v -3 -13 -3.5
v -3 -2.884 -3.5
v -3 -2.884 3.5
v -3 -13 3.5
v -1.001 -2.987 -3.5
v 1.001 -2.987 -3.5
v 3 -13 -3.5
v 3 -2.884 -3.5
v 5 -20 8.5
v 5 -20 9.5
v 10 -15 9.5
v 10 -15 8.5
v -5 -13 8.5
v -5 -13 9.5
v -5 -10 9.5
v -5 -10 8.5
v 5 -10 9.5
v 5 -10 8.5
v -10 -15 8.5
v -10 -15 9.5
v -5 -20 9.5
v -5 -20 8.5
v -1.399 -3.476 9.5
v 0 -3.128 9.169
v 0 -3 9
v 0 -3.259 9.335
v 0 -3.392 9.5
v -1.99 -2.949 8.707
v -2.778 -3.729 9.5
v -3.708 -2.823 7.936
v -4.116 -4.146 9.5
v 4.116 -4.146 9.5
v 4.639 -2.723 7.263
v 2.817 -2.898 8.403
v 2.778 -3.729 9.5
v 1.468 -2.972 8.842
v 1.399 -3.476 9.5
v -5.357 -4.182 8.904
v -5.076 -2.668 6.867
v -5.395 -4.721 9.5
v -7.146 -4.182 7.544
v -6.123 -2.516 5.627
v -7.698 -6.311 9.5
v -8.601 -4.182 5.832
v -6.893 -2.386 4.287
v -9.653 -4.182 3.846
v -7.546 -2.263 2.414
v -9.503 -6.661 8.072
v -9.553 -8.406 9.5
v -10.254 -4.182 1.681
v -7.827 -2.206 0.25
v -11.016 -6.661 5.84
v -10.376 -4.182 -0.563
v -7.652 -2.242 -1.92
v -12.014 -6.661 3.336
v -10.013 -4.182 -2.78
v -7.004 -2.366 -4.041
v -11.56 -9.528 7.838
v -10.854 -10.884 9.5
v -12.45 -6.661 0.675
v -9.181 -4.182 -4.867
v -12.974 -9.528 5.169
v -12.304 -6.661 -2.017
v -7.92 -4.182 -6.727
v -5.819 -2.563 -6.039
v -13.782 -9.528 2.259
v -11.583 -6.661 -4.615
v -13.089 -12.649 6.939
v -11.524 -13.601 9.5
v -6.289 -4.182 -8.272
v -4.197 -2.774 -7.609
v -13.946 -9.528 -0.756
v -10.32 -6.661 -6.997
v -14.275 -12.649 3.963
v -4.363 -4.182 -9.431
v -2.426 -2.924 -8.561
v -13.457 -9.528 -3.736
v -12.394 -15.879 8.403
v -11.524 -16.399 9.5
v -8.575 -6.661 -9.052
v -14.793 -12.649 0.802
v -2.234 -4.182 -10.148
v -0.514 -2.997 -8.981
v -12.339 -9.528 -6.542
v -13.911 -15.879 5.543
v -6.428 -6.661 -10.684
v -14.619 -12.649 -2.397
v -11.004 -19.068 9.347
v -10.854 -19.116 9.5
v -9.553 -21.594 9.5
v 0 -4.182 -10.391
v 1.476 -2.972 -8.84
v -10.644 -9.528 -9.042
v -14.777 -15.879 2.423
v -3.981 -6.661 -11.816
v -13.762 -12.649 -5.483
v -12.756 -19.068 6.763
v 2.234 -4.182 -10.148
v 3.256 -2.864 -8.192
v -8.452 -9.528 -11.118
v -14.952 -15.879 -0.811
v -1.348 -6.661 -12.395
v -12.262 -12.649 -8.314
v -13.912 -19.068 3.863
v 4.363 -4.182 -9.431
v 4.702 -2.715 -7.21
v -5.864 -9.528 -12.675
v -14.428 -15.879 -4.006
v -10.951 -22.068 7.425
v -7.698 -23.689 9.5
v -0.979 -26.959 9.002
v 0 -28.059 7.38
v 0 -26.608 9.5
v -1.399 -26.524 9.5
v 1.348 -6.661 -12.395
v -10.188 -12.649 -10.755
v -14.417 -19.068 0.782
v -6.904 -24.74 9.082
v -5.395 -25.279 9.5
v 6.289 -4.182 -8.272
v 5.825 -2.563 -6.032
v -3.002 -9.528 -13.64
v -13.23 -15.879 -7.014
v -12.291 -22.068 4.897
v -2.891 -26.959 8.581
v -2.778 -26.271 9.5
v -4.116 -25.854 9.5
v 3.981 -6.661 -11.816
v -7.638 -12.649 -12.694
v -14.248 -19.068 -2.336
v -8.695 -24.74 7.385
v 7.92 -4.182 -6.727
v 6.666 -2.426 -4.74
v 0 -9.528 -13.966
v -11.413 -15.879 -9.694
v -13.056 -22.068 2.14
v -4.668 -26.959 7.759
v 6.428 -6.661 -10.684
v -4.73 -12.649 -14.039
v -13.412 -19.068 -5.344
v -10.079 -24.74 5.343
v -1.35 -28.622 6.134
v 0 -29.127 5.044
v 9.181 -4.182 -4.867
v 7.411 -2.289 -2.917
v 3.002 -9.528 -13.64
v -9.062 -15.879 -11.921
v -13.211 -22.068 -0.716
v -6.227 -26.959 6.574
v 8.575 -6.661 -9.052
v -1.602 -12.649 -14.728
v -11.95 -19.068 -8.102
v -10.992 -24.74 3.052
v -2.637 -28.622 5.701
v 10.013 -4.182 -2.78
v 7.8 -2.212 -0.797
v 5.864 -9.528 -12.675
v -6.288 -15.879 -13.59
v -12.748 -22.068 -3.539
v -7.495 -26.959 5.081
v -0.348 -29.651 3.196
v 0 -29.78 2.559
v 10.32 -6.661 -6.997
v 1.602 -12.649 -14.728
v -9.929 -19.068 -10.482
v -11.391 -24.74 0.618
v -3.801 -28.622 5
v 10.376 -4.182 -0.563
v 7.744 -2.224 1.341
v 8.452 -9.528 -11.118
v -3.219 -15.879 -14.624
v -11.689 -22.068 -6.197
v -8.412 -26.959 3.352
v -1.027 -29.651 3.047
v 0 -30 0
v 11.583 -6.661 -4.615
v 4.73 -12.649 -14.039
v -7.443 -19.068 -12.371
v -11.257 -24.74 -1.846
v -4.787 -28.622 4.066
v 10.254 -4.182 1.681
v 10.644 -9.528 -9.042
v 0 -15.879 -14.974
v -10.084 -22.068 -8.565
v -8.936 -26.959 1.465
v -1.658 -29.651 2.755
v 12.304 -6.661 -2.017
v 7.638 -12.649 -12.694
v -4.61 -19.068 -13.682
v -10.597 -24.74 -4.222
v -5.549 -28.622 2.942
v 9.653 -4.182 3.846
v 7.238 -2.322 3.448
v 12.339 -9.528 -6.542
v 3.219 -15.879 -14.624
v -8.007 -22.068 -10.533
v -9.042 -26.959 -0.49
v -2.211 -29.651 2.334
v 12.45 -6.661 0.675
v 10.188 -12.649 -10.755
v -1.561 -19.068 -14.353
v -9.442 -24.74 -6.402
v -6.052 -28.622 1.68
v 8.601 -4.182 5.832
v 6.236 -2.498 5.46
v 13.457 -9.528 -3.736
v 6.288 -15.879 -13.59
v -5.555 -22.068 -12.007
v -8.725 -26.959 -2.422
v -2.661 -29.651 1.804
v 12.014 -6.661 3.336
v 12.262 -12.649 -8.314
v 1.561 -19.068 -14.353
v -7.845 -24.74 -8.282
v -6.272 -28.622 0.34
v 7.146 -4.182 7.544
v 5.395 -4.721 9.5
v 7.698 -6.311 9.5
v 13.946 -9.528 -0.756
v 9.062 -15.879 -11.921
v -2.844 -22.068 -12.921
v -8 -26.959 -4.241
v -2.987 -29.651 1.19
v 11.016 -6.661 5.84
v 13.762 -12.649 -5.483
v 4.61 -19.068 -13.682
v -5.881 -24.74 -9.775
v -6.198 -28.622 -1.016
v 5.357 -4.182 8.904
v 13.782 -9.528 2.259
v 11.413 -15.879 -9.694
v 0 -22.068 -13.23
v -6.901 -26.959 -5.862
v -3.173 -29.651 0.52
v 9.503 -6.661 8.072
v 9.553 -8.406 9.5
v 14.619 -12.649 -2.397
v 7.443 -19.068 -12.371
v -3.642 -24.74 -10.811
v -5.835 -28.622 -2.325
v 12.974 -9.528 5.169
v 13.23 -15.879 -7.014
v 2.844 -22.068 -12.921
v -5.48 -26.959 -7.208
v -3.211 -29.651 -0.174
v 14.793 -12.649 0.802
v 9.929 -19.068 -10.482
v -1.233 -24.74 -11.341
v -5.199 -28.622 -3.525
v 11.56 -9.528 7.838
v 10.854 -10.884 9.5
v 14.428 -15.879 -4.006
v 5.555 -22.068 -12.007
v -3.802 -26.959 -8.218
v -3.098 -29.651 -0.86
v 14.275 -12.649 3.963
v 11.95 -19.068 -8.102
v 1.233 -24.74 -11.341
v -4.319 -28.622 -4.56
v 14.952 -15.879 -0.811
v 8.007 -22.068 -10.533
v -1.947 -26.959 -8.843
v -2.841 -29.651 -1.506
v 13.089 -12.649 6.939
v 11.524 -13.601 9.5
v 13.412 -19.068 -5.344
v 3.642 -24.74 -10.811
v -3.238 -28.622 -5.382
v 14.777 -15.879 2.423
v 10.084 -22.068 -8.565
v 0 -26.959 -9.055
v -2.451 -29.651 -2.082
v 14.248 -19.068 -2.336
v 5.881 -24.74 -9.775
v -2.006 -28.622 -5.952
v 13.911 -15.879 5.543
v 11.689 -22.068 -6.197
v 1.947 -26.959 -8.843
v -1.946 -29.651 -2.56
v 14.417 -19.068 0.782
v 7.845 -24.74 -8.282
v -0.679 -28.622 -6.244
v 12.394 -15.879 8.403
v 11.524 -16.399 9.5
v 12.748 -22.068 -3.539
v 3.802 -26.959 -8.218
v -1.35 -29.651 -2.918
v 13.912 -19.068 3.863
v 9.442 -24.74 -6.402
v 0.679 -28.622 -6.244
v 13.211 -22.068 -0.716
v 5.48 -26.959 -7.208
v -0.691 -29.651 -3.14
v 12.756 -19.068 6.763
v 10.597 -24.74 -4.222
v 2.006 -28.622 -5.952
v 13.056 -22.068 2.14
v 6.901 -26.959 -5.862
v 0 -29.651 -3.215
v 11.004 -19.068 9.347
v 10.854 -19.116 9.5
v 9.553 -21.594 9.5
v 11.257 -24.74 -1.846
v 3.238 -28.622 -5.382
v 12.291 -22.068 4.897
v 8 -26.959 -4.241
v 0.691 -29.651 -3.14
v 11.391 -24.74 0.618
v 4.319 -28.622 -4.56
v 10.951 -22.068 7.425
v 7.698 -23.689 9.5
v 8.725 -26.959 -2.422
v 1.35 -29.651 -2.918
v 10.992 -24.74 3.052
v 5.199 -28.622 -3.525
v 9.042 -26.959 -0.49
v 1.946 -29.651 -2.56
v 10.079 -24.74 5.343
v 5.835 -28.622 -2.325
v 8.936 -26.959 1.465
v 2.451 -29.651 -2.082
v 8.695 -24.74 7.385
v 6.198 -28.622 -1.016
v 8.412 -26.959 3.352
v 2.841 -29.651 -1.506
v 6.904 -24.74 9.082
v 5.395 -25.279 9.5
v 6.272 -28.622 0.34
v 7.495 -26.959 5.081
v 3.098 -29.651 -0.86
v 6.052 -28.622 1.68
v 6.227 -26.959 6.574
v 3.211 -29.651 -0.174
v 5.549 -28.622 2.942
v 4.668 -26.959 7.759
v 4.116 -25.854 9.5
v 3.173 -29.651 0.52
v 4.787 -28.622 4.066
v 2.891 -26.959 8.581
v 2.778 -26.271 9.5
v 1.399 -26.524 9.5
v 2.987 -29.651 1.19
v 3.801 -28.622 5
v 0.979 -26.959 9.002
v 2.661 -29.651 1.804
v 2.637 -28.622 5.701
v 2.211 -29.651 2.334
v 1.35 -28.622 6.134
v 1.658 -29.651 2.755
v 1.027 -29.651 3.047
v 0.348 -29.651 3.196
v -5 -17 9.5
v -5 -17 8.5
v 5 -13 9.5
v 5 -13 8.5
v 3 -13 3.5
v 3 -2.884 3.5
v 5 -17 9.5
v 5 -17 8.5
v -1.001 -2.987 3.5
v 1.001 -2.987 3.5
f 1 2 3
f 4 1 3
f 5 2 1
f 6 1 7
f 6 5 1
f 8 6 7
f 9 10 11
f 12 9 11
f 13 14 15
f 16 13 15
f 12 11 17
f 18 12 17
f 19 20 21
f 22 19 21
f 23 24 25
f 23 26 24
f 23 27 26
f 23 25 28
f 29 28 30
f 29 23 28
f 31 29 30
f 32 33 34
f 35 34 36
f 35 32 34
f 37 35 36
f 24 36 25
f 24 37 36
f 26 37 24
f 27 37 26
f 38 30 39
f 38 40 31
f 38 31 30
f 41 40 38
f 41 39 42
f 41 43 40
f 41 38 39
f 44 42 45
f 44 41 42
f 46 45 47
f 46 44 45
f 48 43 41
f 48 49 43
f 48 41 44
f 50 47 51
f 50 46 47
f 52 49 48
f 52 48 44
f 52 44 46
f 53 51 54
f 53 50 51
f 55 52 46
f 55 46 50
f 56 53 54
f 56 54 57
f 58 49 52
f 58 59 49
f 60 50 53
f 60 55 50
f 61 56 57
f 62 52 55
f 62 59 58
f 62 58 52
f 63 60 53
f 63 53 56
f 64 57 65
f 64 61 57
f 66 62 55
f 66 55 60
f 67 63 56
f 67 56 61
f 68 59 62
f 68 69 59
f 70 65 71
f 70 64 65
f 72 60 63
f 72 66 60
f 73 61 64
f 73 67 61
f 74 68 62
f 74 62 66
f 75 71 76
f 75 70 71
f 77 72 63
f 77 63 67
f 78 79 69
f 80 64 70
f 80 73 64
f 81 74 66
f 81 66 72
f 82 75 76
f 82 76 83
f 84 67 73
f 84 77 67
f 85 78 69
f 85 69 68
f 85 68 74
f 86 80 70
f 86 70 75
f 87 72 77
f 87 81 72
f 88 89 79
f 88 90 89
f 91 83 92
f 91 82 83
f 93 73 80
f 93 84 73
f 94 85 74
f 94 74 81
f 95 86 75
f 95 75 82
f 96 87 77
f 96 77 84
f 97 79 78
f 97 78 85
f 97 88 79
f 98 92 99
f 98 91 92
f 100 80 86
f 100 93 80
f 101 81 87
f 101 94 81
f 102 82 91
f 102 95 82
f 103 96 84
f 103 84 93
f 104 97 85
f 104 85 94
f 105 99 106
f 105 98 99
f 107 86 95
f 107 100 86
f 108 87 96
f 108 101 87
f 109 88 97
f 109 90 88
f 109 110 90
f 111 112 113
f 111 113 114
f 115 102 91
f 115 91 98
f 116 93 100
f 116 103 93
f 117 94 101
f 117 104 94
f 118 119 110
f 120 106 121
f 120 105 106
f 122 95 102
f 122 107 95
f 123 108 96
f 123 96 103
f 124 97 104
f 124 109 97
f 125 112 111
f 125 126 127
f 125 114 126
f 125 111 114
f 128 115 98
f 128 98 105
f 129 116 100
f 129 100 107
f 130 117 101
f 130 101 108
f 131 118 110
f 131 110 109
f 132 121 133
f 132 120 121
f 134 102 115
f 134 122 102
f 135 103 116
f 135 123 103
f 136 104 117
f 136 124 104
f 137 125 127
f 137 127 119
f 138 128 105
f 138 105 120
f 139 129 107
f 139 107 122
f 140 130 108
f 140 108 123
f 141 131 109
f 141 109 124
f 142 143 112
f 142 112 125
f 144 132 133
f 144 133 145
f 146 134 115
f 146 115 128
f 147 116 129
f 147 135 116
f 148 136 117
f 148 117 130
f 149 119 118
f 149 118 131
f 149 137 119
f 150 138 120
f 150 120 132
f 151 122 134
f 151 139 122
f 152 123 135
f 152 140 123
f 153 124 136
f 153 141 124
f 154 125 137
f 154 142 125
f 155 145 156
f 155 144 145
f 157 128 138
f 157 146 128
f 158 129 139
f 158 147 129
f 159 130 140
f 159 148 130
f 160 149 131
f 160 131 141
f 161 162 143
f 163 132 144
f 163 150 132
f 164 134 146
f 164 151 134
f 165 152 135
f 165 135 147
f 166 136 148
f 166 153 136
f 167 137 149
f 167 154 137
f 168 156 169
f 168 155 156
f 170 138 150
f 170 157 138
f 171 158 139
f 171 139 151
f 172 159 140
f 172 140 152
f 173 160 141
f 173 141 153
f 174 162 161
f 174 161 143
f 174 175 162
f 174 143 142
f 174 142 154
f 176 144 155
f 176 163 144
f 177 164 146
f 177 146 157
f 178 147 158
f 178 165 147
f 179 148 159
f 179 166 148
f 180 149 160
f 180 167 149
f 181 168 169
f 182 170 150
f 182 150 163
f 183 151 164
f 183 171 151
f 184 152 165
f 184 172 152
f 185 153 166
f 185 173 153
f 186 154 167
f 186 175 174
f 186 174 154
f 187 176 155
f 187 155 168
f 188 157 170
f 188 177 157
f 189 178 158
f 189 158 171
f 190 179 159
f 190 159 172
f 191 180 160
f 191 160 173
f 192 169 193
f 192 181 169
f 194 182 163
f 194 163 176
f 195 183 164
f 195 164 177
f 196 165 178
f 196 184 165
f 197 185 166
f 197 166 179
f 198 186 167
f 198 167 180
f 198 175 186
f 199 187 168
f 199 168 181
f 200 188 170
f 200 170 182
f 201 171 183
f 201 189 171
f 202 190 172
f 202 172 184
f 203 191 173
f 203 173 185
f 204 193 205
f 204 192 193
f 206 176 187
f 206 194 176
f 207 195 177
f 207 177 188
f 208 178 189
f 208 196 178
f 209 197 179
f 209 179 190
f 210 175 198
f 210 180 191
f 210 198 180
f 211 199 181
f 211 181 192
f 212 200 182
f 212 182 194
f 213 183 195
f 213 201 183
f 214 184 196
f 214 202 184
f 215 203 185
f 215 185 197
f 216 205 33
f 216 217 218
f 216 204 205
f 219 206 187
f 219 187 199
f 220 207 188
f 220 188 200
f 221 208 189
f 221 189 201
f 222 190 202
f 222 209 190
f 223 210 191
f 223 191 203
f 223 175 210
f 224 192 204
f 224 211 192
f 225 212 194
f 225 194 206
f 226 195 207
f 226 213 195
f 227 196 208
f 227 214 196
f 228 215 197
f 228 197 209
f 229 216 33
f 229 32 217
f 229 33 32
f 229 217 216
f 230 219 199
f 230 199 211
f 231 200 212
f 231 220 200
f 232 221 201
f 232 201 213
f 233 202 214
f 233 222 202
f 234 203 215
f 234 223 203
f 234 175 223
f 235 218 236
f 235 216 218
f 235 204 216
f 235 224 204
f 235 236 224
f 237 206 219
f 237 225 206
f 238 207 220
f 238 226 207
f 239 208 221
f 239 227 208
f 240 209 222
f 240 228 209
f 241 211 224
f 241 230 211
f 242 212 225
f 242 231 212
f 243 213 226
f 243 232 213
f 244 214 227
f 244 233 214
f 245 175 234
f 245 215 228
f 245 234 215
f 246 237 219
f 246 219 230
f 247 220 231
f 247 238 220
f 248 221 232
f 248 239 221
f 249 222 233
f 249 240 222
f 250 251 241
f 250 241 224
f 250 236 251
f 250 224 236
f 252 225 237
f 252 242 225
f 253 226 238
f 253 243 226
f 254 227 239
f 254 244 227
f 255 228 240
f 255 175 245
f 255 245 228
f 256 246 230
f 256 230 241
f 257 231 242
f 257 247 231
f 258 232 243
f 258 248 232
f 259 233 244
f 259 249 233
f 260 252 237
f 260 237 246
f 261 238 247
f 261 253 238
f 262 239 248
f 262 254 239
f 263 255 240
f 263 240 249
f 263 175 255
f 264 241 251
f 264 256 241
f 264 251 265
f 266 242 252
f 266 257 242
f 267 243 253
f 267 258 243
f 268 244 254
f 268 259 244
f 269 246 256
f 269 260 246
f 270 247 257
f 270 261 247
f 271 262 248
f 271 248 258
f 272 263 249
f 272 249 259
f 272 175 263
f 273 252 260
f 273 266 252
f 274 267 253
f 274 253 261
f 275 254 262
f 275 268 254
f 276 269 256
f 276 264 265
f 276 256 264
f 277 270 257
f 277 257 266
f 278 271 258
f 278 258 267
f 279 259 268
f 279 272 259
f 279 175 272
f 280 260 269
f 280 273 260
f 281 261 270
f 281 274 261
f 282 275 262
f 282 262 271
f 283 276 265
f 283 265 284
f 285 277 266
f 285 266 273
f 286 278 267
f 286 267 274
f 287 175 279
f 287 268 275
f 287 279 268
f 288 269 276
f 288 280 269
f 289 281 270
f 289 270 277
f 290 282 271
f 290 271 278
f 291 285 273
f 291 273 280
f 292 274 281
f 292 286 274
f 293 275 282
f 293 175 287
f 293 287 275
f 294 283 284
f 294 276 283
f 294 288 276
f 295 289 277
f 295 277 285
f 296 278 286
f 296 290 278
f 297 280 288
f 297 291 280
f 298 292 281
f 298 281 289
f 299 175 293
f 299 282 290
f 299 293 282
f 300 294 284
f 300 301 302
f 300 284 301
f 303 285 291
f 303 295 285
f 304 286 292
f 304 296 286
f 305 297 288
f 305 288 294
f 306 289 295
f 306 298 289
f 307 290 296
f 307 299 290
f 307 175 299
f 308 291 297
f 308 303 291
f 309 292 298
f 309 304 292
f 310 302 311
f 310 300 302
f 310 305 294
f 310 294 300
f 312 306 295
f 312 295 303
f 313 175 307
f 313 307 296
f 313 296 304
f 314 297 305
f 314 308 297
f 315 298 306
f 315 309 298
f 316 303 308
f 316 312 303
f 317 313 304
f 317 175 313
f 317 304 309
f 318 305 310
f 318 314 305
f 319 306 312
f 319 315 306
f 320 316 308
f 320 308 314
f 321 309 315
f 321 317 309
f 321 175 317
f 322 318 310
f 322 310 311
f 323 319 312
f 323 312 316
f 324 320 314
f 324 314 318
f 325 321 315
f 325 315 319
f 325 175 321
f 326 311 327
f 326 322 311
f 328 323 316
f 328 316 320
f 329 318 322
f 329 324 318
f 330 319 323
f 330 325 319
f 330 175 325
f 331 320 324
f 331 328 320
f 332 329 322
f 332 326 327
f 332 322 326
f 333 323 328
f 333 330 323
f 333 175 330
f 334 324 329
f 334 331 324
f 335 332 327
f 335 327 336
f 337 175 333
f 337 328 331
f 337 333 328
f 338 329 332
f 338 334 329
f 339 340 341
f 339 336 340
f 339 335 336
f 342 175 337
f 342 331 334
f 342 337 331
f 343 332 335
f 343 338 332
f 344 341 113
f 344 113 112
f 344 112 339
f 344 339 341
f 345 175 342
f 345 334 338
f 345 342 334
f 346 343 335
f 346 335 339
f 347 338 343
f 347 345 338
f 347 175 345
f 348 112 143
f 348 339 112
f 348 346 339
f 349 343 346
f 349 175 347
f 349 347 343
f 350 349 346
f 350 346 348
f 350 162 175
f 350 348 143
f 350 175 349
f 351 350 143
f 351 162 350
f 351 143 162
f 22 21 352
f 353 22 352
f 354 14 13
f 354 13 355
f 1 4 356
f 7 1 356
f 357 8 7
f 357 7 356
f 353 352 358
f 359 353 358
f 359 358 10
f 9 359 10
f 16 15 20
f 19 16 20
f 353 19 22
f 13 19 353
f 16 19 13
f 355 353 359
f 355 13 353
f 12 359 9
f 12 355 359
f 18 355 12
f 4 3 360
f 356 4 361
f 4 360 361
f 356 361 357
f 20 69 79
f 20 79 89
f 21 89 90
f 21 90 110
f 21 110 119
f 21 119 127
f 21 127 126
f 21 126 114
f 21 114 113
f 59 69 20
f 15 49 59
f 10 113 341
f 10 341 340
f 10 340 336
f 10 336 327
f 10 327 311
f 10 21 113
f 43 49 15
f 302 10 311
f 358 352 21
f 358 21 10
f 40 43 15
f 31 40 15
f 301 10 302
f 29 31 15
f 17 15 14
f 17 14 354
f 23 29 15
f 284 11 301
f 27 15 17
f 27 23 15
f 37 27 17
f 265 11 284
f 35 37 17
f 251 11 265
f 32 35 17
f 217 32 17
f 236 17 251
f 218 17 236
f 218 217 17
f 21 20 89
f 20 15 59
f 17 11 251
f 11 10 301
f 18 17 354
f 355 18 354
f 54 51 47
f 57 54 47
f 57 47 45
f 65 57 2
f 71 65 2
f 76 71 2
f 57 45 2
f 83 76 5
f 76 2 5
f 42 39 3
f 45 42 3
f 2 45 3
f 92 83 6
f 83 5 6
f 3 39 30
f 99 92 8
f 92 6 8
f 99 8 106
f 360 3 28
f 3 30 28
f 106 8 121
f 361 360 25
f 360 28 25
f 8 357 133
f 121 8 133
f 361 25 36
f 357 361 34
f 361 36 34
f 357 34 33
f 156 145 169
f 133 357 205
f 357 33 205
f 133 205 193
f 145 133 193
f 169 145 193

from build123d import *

# Parameters (mm, degrees)
F4_DEPTH  = 30.001
F5_W      = 6
F5_H      = 7
F6_DEPTH  = 13
F7_W      = 50.395424
F7_H      = 8.032865
F8_DEPTH  = 30.001
F9_W      = 10
F9_H      = 4
F10_DEPTH = 1


with BuildPart() as f1:
    # F0 (on Right) → F1 (revolve)
    with BuildSketch(Plane.YZ):
        with BuildLine():
            Line((-30, 0), (0, 0))
            ThreePointArc((0, 0), (-15, 15), (-30, 0))
        make_face()
    revolve(axis=Axis((0, -15, 0), (0, -1, 0)))

    # F3 (on offset) → F4 (cut, through all)
    with BuildSketch(Plane.XY.offset(15)):
        with BuildLine():
            Line((15, 0), (0, 0))
            Line((0, 0), (-15, 0))
            ThreePointArc((-15, 0), (0, -3), (15, 0))
        make_face()
    extrude(amount=-F4_DEPTH, mode=Mode.SUBTRACT)

    # F5 (on Front) → F6 (cut)
    with BuildSketch(Plane.XZ):
        Rectangle(F5_W, F5_H)
    extrude(amount=F6_DEPTH, mode=Mode.SUBTRACT)

    # F7 (on Front) → F8 (cut, through all)
    with BuildSketch(Plane.XZ):
        with Locations((-1.727619, 13.516432)):
            Rectangle(F7_W, F7_H)
    extrude(amount=F8_DEPTH, mode=Mode.SUBTRACT)

    # F9 (on face) → F10 (cut)
    with BuildSketch(Plane.XY.offset(9.5)):
        with Locations((0, -15)):
            Rectangle(F9_W, F9_H)
        Polygon((-5, -17), (-5, -13), (-5, -10), (-10, -15), (-5, -20), align=None)
        Polygon((5, -10), (5, -13), (5, -17), (5, -20), (10, -15), align=None)
    extrude(amount=-F10_DEPTH, mode=Mode.SUBTRACT)


solid = f1.part
